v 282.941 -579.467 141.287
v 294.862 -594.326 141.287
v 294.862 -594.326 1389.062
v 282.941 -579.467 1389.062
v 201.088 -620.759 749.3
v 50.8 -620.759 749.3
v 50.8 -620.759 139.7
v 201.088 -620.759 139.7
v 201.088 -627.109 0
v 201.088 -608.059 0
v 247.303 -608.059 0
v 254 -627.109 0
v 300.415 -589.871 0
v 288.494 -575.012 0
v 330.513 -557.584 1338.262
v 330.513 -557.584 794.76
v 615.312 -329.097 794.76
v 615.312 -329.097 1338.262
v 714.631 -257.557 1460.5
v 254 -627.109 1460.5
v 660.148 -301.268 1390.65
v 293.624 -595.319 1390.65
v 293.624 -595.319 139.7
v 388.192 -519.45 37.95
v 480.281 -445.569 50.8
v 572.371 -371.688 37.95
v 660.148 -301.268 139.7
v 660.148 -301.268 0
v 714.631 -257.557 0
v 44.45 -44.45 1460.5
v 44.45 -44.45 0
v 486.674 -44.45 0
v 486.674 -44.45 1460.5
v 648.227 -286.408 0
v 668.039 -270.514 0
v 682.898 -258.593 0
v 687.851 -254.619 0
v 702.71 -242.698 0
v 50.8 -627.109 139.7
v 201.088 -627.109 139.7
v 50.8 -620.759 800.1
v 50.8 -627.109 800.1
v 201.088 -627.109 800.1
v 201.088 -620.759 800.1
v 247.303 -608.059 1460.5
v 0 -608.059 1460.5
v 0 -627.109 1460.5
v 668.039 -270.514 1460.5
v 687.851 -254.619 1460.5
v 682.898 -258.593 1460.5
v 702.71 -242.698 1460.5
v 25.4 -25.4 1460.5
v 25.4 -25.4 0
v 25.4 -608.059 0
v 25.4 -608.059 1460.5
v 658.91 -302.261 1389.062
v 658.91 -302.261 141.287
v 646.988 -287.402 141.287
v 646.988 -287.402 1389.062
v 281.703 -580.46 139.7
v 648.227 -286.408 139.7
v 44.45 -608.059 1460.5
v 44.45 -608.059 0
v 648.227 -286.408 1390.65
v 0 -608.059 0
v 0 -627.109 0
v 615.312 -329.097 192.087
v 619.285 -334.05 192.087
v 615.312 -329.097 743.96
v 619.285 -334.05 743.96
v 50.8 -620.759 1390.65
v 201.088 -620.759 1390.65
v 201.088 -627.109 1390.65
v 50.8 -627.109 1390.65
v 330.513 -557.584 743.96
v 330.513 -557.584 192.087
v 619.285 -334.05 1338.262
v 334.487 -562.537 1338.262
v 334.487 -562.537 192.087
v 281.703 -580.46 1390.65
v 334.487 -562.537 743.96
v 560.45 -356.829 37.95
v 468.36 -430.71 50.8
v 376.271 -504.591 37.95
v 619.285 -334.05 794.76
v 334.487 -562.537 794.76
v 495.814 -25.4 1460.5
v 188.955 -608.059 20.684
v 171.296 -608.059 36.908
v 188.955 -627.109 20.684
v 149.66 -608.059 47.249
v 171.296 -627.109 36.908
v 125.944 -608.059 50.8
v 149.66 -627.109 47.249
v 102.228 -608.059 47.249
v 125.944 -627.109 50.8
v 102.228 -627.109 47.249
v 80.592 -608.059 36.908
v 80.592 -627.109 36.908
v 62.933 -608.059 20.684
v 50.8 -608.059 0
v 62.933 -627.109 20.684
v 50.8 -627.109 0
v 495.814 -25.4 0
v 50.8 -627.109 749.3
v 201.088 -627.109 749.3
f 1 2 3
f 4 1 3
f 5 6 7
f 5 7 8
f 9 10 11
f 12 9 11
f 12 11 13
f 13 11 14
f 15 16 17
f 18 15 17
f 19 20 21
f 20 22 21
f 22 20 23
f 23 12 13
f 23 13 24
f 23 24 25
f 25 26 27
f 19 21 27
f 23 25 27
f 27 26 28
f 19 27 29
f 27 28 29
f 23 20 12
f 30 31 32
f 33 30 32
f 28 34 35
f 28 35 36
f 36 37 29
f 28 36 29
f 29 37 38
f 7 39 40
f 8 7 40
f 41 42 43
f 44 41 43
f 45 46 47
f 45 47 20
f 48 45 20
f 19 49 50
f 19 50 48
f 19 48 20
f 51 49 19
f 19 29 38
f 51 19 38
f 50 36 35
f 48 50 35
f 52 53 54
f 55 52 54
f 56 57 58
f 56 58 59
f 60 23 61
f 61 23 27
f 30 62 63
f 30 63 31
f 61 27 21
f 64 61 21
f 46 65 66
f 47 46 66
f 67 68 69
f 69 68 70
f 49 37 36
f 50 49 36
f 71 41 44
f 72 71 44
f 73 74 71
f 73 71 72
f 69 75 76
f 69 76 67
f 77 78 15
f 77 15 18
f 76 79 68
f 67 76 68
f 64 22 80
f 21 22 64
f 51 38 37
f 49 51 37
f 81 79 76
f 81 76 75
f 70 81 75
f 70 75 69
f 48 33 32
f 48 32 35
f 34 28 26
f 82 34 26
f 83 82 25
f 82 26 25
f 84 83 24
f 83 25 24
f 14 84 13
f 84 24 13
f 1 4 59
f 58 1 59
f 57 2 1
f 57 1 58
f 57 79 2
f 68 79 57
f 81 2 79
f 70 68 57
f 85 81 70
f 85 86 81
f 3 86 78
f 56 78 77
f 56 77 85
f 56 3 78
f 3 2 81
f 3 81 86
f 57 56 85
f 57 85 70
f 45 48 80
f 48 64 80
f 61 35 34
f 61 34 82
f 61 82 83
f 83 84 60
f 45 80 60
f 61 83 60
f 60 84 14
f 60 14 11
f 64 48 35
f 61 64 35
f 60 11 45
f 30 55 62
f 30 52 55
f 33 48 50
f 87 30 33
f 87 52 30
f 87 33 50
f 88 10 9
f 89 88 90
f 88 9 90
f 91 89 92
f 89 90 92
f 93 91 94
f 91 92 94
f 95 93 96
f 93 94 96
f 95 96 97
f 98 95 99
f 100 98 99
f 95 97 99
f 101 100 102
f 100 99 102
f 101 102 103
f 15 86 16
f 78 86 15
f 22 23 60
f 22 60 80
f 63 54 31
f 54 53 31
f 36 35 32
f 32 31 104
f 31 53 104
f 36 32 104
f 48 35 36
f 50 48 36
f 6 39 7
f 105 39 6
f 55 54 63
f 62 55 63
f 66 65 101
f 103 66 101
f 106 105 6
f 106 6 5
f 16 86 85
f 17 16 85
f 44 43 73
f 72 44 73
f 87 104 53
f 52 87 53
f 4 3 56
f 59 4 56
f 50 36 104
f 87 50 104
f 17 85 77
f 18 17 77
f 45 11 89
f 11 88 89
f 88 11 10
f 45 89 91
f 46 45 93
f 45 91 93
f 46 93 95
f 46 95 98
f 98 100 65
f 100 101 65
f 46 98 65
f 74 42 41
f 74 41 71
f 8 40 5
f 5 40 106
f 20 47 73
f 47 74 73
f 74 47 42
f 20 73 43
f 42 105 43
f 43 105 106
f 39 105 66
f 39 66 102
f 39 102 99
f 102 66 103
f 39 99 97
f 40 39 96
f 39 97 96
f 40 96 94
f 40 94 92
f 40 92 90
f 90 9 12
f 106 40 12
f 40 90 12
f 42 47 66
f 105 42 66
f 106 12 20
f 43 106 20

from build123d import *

# Parameters (mm, degrees)
F0_W      = 19.05
F0_H      = 563.6087166513
F1_DEPTH  = 1460.5
F2_DEPTH  = 1460.5
F3_W      = 150.2883361875
F3_H      = 590.55
F3_H_2    = 609.6
F4_DEPTH  = 6.35
F5_DEPTH  = 19.05
F6_W      = 469.9
F6_H      = 1250.95
F7_DEPTH  = 25.4
F8_W      = 466.725
F8_H      = 1247.775
F8_W_2    = 365.125
F8_H_2    = 50.8
F8_H_3    = 543.5021896
F8_H_4    = 551.8728104
F9_DEPTH  = 19.05
F10_DEPTH = 6.35
F11_DEPTH = 25.4


with BuildPart() as f1:
    # F0 (on Top) → F1 (new body)
    with BuildSketch(Plane.XY):
        with Locations((34.925, -326.2543583256)):
            Rectangle(F0_W, F0_H)
        Polygon((25.4, -44.45), (44.45, -44.45), (486.6740819534, -44.45), (495.8137611162, -25.4), (25.4, -25.4), align=None)
        Polygon((486.6740819534, -44.45), (668.0388310507, -270.5137659268), (682.8978955973, -258.5927466416), (495.8137611162, -25.4), align=None)
    extrude(amount=F1_DEPTH)


with BuildPart() as f2:
    # F0 (on Top) → F2 (new body)
    with BuildSketch(Plane.XY):
        Polygon((0, -608.0587166513), (0, -627.1087166513), (254, -627.1087166513), (247.3028109026, -608.0587166513), (44.45, -608.0587166513), (25.4, -608.0587166513), (19.05, -608.0587166513), align=None)
        Polygon((247.3028109026, -608.0587166513), (254, -627.1087166513), (714.6310009447, -257.5571188078), (702.7099816595, -242.6980542612), (687.8509171129, -254.6190735465), (682.8978955973, -258.5927466416), (668.0388310507, -270.5137659268), align=None)
    extrude(amount=F2_DEPTH)

    # F3 (on face) → F4 (cut)
    with BuildSketch(Plane.XZ.offset(627.1087166513)):
        with Locations((125.9441680937, 1095.375)):
            Rectangle(F3_W, F3_H)
        with Locations((125.9441680937, 444.5)):
            Rectangle(F3_W, F3_H_2)
    extrude(amount=-F4_DEPTH, mode=Mode.SUBTRACT)

    # F3 (on face) → F5 (cut, through all)
    with BuildSketch(Plane.XZ.offset(627.1087166513)):
        with BuildLine():
            ThreePointArc((201.0883361875, 0), (125.9441680937, 50.8), (50.8, 0))
            Line((50.8, 0), (201.0883361875, 0))
        make_face()
    extrude(amount=-F5_DEPTH, mode=Mode.SUBTRACT)

    # F6 (on face) → F7 (cut)
    with BuildSketch(Plane(origin=(405.5611158002, -505.5153970527, 0), x_dir=(0.7800033883, 0.6257752906, 0), z_dir=(0.6257752906, -0.7800033883, 0))):
        with Locations((91.4417212428, 765.175)):
            Rectangle(F6_W, F6_H)
    extrude(amount=-F7_DEPTH, mode=Mode.SUBTRACT)

    # F6 (on face) → F11 (cut)
    with BuildSketch(Plane(origin=(405.5611158002, -505.5153970527, 0), x_dir=(0.7800033883, 0.6257752906, 0), z_dir=(0.6257752906, -0.7800033883, 0))):
        with BuildLine():
            ThreePointArc((326.3917212428, 0), (95.7947475759, 50.8), (-134.802226091, 0))
            Line((-134.802226091, 0), (326.3917212428, 0))
        make_face()
    extrude(amount=-F11_DEPTH, mode=Mode.SUBTRACT)


with BuildPart() as f9:
    # F8 (on face) → F9 (new body)
    with BuildSketch(Plane(origin=(405.5611158002, -505.5153970527, 0), x_dir=(0.7800033883, 0.6257752906, 0), z_dir=(0.6257752906, -0.7800033883, 0))):
        with Locations((91.4417212428, 765.175)):
            Rectangle(F8_W, F8_H)
        Polygon((-91.1207787572, 794.7603104), (-91.1207787572, 1338.2625), (274.0042212428, 1338.2625), (274.0042212428, 794.7603104), (274.0042212428, 743.9603104), (274.0042212428, 192.0875), (-91.1207787572, 192.0875), (-91.1207787572, 743.9603104), align=None, mode=Mode.SUBTRACT)
        with Locations((91.4417212428, 769.3603104)):
            Rectangle(F8_W_2, F8_H_2)
        with Locations((91.4417212428, 1066.5114052)):
            Rectangle(F8_W_2, F8_H_3)
        with Locations((91.4417212428, 468.0239052)):
            Rectangle(F8_W_2, F8_H_4)
    extrude(amount=-F9_DEPTH)

    # F8 (on face) → F10 (cut)
    with BuildSketch(Plane(origin=(405.5611158002, -505.5153970527, 0), x_dir=(0.7800033883, 0.6257752906, 0), z_dir=(0.6257752906, -0.7800033883, 0))):
        with Locations((91.4417212428, 1066.5114052)):
            Rectangle(F8_W_2, F8_H_3)
        with Locations((91.4417212428, 468.0239052)):
            Rectangle(F8_W_2, F8_H_4)
    extrude(amount=-F10_DEPTH, mode=Mode.SUBTRACT)


solid = Compound([f1.part, f2.part, f9.part])
